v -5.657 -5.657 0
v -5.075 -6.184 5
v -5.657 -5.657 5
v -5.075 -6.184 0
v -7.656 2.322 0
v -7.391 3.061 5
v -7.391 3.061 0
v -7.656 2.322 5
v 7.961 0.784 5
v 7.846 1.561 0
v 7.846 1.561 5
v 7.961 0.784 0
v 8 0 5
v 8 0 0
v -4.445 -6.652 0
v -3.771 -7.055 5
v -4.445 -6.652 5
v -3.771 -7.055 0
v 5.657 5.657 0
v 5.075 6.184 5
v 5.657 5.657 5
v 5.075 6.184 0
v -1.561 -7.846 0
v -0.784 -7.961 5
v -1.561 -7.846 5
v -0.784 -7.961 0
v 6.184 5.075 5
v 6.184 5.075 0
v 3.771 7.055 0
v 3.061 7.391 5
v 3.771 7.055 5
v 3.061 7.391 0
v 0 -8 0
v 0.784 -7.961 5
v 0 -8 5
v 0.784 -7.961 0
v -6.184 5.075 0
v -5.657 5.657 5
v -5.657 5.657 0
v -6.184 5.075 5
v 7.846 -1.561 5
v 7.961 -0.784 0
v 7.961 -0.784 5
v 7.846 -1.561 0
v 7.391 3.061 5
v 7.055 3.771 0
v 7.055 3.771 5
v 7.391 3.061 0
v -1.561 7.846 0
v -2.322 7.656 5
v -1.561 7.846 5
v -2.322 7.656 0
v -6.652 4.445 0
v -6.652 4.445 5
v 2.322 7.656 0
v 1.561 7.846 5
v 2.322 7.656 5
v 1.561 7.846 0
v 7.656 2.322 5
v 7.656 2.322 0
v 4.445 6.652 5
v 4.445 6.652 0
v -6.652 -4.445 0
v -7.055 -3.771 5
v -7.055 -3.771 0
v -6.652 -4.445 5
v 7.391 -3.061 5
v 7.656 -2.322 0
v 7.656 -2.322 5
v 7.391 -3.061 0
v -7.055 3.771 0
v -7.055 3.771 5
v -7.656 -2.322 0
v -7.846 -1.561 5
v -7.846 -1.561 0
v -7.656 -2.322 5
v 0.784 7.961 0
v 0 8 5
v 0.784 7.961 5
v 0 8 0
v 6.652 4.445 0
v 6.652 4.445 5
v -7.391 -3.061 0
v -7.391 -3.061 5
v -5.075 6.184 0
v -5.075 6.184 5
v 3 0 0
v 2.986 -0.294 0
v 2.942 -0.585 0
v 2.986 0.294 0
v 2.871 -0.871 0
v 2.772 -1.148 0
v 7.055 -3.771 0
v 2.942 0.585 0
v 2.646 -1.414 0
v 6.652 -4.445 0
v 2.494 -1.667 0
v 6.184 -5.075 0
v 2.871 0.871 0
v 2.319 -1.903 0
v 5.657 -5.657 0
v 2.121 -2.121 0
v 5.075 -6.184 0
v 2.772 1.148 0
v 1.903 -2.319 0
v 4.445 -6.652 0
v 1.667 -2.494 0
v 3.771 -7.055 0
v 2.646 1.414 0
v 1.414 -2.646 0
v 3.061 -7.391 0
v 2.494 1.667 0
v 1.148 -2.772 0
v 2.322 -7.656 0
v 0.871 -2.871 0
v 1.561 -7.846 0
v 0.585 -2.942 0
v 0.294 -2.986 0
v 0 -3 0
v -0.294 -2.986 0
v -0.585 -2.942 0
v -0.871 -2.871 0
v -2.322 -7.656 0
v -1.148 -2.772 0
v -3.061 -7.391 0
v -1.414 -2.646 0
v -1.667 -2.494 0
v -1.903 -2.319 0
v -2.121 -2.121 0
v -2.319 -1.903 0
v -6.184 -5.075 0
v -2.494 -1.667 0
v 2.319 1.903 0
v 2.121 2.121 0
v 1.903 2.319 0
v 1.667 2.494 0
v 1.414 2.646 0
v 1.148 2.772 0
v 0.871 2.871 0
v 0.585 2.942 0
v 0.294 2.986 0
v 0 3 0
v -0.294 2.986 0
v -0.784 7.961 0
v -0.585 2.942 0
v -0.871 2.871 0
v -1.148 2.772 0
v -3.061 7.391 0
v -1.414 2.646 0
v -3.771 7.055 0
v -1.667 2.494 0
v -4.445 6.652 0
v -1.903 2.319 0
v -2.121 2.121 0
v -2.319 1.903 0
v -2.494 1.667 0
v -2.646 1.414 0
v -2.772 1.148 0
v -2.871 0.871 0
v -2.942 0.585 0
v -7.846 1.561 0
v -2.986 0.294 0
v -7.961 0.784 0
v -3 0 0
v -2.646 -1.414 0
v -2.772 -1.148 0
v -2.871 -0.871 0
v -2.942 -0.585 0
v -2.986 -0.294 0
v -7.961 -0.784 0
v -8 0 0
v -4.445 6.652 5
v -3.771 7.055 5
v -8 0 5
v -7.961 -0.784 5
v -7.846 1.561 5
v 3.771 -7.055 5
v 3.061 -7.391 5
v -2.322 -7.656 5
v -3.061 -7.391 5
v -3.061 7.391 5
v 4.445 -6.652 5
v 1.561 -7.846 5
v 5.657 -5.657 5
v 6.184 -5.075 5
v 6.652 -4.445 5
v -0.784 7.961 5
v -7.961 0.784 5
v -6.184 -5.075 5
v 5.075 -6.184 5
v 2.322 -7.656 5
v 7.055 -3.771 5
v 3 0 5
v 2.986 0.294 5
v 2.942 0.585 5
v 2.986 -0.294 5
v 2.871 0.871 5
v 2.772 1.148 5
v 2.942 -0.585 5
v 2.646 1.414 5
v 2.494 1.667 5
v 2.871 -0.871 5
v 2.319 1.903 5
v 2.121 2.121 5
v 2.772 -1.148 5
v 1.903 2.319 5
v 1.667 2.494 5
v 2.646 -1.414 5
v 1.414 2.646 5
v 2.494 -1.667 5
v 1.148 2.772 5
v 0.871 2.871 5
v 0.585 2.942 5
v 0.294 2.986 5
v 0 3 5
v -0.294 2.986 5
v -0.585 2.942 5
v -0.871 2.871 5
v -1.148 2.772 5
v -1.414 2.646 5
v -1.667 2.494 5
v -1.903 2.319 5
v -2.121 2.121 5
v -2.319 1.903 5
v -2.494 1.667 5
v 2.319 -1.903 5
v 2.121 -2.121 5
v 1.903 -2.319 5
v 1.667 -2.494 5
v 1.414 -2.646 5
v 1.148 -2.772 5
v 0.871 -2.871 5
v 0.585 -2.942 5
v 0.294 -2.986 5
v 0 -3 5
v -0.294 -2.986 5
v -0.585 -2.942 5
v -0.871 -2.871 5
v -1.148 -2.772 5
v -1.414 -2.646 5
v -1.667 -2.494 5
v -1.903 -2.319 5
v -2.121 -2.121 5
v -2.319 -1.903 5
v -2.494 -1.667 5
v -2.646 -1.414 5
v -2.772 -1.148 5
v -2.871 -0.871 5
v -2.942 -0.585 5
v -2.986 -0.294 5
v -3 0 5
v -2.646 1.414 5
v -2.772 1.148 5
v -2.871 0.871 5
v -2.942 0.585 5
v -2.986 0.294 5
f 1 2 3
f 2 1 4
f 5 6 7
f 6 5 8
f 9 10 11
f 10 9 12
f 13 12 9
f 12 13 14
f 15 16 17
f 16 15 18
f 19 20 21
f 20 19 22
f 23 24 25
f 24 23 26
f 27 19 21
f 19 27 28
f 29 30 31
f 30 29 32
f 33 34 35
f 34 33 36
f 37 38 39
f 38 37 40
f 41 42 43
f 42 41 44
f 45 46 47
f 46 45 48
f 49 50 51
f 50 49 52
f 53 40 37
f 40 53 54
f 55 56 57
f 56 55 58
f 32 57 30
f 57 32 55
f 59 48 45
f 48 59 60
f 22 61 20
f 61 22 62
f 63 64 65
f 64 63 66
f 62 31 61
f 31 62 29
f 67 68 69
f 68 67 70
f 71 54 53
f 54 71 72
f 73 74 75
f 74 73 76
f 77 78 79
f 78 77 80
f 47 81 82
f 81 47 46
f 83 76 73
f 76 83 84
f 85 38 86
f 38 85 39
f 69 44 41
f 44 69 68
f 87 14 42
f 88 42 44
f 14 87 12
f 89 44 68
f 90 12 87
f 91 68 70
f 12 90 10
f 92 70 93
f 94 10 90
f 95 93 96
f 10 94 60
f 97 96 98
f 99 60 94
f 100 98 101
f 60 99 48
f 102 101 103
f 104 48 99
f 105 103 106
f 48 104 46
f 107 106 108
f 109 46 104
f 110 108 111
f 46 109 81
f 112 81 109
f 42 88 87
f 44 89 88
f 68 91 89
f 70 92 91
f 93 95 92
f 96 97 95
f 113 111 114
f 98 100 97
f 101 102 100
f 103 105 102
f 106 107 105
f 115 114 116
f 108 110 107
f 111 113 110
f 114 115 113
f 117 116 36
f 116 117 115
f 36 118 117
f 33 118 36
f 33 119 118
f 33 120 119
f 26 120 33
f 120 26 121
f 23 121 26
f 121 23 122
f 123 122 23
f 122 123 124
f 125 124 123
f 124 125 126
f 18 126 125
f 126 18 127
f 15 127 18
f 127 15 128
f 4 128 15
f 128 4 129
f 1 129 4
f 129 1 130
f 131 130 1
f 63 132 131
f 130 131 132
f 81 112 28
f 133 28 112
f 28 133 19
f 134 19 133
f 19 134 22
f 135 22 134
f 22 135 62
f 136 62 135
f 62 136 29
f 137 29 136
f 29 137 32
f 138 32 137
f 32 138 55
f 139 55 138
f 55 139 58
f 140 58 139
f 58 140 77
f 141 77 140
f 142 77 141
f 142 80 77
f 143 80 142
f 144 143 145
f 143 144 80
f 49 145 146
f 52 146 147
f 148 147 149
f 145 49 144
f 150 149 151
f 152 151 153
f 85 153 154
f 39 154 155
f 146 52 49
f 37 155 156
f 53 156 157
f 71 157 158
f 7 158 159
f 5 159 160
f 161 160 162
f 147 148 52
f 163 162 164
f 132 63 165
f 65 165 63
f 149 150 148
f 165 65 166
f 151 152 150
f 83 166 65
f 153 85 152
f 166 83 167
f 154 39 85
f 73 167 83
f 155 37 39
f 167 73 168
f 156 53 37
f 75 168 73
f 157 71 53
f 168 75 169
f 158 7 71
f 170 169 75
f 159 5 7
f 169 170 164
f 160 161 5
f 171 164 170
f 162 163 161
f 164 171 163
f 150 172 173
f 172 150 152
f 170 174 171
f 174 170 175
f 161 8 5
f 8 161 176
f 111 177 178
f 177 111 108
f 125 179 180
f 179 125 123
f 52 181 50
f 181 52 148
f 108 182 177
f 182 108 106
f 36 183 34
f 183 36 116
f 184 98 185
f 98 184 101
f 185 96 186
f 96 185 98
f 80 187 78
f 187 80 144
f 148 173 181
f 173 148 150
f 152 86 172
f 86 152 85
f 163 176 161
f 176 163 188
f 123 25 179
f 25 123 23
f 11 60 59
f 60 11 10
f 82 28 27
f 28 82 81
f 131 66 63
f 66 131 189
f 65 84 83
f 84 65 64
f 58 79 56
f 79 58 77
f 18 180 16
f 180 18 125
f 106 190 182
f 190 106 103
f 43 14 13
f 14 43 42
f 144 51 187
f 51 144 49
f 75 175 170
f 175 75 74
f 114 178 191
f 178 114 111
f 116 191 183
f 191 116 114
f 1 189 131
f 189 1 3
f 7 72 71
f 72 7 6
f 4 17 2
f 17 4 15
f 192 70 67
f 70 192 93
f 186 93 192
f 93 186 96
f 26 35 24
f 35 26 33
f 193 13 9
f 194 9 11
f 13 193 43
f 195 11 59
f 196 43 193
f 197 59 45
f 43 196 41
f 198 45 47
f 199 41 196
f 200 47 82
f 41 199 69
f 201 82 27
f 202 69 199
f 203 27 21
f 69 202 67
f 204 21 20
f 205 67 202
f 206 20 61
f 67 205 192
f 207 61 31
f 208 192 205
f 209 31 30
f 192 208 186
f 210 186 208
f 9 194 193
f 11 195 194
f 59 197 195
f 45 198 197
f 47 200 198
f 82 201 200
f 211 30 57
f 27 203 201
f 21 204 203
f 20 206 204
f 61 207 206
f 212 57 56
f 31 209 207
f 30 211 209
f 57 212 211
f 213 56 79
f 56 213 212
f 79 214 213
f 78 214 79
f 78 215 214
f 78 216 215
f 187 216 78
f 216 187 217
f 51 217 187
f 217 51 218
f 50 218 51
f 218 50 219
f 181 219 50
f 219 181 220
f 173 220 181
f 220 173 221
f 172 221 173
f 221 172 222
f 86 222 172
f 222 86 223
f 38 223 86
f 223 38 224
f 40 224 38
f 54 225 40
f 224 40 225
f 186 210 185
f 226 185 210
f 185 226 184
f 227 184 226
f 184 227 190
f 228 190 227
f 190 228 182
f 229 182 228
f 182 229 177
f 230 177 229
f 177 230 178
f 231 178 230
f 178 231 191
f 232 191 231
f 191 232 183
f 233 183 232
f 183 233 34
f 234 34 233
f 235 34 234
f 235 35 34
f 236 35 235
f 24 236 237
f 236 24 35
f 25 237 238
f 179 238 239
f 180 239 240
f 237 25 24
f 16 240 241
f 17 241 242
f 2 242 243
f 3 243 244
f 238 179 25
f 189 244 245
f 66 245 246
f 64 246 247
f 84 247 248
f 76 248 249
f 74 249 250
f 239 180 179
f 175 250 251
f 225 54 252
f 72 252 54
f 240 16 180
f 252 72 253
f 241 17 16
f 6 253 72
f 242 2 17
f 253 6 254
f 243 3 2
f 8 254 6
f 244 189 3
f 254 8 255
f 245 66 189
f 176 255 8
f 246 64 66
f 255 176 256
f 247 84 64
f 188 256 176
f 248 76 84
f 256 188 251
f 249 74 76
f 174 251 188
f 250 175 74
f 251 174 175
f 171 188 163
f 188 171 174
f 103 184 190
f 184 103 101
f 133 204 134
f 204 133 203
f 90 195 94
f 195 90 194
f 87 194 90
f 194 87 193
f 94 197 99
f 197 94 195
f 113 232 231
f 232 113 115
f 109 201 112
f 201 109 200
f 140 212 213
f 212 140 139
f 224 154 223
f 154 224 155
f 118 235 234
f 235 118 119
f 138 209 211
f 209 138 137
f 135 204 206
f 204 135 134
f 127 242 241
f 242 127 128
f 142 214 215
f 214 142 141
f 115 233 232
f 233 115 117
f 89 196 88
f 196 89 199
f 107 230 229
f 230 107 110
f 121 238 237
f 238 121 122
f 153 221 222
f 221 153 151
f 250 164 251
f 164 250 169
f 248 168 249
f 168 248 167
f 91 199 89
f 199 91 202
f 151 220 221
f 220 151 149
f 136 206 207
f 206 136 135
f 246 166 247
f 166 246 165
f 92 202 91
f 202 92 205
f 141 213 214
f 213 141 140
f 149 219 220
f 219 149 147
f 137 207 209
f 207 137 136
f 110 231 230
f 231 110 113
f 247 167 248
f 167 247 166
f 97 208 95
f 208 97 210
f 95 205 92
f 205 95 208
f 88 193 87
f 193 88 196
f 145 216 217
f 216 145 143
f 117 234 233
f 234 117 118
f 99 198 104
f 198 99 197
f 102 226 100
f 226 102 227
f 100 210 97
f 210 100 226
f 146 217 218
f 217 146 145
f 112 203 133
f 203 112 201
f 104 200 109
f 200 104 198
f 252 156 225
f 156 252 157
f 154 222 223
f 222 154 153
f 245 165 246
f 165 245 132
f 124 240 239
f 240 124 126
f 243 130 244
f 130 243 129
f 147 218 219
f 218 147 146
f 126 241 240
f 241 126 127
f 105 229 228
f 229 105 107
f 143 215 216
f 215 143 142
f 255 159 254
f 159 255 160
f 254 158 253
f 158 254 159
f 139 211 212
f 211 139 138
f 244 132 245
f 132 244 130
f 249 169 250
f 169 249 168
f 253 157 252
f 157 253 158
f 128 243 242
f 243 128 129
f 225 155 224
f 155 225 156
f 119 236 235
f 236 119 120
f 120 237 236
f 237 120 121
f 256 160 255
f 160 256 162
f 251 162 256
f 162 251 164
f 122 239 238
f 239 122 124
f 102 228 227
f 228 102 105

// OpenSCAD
module ball_bearing() {
    difference() {
        // Outer cylinder
        cylinder(d=16.0, h=5.0, $fn=64);
        
        // Inner bore
        translate([0, 0, -1])
            cylinder(d=6.0, h=7.0, $fn=64);
    }
}

ball_bearing();
